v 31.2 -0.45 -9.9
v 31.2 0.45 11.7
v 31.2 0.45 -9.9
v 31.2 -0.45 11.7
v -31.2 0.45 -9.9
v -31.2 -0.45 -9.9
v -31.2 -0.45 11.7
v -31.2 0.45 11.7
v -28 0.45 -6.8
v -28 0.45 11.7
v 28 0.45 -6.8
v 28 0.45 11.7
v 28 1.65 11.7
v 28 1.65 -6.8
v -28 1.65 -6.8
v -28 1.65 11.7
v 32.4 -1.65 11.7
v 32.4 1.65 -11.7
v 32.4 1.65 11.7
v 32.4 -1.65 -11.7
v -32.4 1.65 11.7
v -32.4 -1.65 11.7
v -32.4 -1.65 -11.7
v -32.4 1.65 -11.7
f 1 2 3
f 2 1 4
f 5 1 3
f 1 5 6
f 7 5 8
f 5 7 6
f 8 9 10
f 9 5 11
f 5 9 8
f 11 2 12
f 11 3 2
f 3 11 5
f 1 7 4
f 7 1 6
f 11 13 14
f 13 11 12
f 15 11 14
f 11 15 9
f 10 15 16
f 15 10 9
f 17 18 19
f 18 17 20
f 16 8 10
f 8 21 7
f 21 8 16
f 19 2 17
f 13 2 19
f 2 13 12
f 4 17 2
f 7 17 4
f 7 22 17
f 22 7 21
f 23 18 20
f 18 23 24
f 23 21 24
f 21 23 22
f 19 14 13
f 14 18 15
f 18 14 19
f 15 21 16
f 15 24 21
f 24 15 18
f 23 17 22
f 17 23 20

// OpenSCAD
//
// Parametric Label Holder for Drawers and Cupboards
//
// The label holder can be configured for different paper label
// sizes. It can be made as a glue-on holder using the whole of
// its back or only a part of it for attaching a double-sided
// adhesive tape, or it can be made as a screw-on holder, either
// using flat-headed screws or conical-headed screws (eg. SPAX).
//
// Remarks:
//
// Example parameters for Leitz 1900/1901 labels:
//  - LabelWidth     = 62;
//  - LabelHeight    = 22;
//  - LabelThickness = 0.5;
//
// Choose the label thickness so that the label sits firmly but
// the printer can manage to keep front and back apart.
//
// Choose the wall thickness so that it is a multiple of your
// printer's nozzle width (most printers use 0.4mm nozzles).
//
// When using screw mounts, choose a wall-thickness that adds
// to the stability (especially when using a power screwdriver
// to mount the label holders).
//
// Print upright with ground supports.
// Print with supports when printing a screw-on holder.
//
// TODO:
//   - Option to have a top frame (requires print with supports)
//     Might add a nice look to the whole thing
//   - Bug fixes (yes, there still may be some of those critters)
//   - Option for "clip-on" label holders (eg. heavy-duty racks)
//   - Round front edges on all designs for smoother look
//   - Smoothen egdes on label window
//   - Optional: Make label window a trapezoid
//

LabelWidth     = 62;        // Width of paper label
LabelHeight    = 22;        // Height of paper label
LabelThickness = 0.5;       // Thickness of paper label
WallThickness  = 1.2;       // Thickness of label holder walls

UseScrews      = false;     // Are we using screws to mount it ?

ScrewDiameter  = 4.0;       // Which type of screws are we using ?
FlatheadScrew  = true;
HeadDiameter   = 6.0;
HeadHeight     = 2.0;       // for conical screw heads

// For thicker double-sided tape and/or tape that cannot cover the
// total height of the label holder, it might be nice to cut out a
// small rail in the back for the tape...
TapeWidth      = 25.0;      // Width of double-sided tape
TapeThickness  = 0.0;       // Thickness of double-sided tape

// The following are optional configurational parameters.
// You will probably not have to change those.
FrameBorder    = 3.0;       // Width of window frame
Padding        = 0.2;       // Extra padding for paper label

// Private Data
// Don't change anything below here except you're me!
OuterBoxWidth     = WallThickness * 2.0 + Padding * 2.0 + LabelWidth;
OuterBoxHeight    = WallThickness + Padding + LabelHeight;
OuterBoxThickness = WallThickness * 2.0 + Padding * 2.0 + LabelThickness;

// for smooth geometry...
$fs = 0.1;
$fa = 5;


module screw_head() {       // seating for a screw (if any)
    if( FlatheadScrew ) {
        translate( [ 0, 0, -(OuterBoxThickness / 2.0) ] )
            cylinder( WallThickness, 
                      d = HeadDiameter, 
                      center = true );
    } else {
        translate( [ 0, 0, -(OuterBoxThickness - HeadHeight) ] )
            cylinder( HeadHeight,
                      d1 = HeadDiameter, 
                      d2 = ScrewDiameter,
                      center = true );
    }
}


module screw_hole() {       // channel for a screw to fit through (if any)
    translate( [ OuterBoxHeight / 4.0, 0, 0 ] )
        union () {
            cylinder( OuterBoxThickness, 
                      d = ScrewDiameter, 
                      center = true );
            screw_head();
        }
}


module screw_mount() {      // half-cylinder with hole for screw-on
    rotate( [ 90, 0, 0 ] )  // mounting (if any)
        difference() {                      // There's no need to cut off
            cylinder( OuterBoxThickness,    // half of the cylinder since
                      d = OuterBoxHeight,   // the extra will be removed
                      center = true );      // by the label and window
            screw_hole();                   // boxes...
        }
}


module screw_mounts() {     // place screw mount plates on both sides
    if( UseScrews ) {       // (if any screws used)
        SideOffset = LabelWidth / 2.0 + WallThickness + Padding;
        translate( [ SideOffset, 0, 0 ] )
            screw_mount();
        translate( [ -SideOffset, 0, 0 ] )
            rotate( [ 0, 180, 0 ] )
                screw_mount();
    }
}


module label_box() {        // space where the paper label slides in
    //
    // TODO:
    //   - Check formulas for bugs as this looks a bit as if there
    //     may be some (translate)...
    //
    translate( [ 0, 
                 0, 
                 WallThickness ] )
        cube( [ Padding * 2.0 + LabelWidth,
                Padding * 2.0 + LabelThickness,
                Padding + LabelHeight ], center = true );
}


module label_window() {     // front bezel - what is visible of the
    //                      // paper label
    // TODO:
    //   - Add option for having a top frame
    //   - Check formulas for bugs as this looks a bit as if there
    //     may be some (tanslate, cube)...
    //
    translate( [ 0, 
                 WallThickness / 2.0 + Padding + LabelThickness / 2.0, 
                 WallThickness + FrameBorder / 2 ] )
        cube( [ LabelWidth - FrameBorder * 2.0,
                WallThickness + Padding,
                LabelHeight - FrameBorder ], center = true );
}


module tape_rail() {        // when using glue-on method, this is where
    if( !UseScrews &&       // the double-sided adhesive tape is placed
        (TapeThickness > 0) &&
        (TapeWidth > 0) && (TapeWidth < OuterBoxHeight) ) {
        BackOffset = (WallThickness + Padding + LabelThickness / 2.0) - (TapeThickness / 2.0);
        translate( [ 0, -BackOffset, 0 ] )
            cube( [ OuterBoxWidth,
                    TapeThickness,
                    TapeWidth ], center = true );
    }
}


difference() {              // main body
    union() {
        // outer box
        cube( [ OuterBoxWidth,
                OuterBoxThickness,
                OuterBoxHeight ], center = true );
        screw_mounts();
    }
    union() {
        label_box();
        label_window();
        tape_rail();
    }
}
